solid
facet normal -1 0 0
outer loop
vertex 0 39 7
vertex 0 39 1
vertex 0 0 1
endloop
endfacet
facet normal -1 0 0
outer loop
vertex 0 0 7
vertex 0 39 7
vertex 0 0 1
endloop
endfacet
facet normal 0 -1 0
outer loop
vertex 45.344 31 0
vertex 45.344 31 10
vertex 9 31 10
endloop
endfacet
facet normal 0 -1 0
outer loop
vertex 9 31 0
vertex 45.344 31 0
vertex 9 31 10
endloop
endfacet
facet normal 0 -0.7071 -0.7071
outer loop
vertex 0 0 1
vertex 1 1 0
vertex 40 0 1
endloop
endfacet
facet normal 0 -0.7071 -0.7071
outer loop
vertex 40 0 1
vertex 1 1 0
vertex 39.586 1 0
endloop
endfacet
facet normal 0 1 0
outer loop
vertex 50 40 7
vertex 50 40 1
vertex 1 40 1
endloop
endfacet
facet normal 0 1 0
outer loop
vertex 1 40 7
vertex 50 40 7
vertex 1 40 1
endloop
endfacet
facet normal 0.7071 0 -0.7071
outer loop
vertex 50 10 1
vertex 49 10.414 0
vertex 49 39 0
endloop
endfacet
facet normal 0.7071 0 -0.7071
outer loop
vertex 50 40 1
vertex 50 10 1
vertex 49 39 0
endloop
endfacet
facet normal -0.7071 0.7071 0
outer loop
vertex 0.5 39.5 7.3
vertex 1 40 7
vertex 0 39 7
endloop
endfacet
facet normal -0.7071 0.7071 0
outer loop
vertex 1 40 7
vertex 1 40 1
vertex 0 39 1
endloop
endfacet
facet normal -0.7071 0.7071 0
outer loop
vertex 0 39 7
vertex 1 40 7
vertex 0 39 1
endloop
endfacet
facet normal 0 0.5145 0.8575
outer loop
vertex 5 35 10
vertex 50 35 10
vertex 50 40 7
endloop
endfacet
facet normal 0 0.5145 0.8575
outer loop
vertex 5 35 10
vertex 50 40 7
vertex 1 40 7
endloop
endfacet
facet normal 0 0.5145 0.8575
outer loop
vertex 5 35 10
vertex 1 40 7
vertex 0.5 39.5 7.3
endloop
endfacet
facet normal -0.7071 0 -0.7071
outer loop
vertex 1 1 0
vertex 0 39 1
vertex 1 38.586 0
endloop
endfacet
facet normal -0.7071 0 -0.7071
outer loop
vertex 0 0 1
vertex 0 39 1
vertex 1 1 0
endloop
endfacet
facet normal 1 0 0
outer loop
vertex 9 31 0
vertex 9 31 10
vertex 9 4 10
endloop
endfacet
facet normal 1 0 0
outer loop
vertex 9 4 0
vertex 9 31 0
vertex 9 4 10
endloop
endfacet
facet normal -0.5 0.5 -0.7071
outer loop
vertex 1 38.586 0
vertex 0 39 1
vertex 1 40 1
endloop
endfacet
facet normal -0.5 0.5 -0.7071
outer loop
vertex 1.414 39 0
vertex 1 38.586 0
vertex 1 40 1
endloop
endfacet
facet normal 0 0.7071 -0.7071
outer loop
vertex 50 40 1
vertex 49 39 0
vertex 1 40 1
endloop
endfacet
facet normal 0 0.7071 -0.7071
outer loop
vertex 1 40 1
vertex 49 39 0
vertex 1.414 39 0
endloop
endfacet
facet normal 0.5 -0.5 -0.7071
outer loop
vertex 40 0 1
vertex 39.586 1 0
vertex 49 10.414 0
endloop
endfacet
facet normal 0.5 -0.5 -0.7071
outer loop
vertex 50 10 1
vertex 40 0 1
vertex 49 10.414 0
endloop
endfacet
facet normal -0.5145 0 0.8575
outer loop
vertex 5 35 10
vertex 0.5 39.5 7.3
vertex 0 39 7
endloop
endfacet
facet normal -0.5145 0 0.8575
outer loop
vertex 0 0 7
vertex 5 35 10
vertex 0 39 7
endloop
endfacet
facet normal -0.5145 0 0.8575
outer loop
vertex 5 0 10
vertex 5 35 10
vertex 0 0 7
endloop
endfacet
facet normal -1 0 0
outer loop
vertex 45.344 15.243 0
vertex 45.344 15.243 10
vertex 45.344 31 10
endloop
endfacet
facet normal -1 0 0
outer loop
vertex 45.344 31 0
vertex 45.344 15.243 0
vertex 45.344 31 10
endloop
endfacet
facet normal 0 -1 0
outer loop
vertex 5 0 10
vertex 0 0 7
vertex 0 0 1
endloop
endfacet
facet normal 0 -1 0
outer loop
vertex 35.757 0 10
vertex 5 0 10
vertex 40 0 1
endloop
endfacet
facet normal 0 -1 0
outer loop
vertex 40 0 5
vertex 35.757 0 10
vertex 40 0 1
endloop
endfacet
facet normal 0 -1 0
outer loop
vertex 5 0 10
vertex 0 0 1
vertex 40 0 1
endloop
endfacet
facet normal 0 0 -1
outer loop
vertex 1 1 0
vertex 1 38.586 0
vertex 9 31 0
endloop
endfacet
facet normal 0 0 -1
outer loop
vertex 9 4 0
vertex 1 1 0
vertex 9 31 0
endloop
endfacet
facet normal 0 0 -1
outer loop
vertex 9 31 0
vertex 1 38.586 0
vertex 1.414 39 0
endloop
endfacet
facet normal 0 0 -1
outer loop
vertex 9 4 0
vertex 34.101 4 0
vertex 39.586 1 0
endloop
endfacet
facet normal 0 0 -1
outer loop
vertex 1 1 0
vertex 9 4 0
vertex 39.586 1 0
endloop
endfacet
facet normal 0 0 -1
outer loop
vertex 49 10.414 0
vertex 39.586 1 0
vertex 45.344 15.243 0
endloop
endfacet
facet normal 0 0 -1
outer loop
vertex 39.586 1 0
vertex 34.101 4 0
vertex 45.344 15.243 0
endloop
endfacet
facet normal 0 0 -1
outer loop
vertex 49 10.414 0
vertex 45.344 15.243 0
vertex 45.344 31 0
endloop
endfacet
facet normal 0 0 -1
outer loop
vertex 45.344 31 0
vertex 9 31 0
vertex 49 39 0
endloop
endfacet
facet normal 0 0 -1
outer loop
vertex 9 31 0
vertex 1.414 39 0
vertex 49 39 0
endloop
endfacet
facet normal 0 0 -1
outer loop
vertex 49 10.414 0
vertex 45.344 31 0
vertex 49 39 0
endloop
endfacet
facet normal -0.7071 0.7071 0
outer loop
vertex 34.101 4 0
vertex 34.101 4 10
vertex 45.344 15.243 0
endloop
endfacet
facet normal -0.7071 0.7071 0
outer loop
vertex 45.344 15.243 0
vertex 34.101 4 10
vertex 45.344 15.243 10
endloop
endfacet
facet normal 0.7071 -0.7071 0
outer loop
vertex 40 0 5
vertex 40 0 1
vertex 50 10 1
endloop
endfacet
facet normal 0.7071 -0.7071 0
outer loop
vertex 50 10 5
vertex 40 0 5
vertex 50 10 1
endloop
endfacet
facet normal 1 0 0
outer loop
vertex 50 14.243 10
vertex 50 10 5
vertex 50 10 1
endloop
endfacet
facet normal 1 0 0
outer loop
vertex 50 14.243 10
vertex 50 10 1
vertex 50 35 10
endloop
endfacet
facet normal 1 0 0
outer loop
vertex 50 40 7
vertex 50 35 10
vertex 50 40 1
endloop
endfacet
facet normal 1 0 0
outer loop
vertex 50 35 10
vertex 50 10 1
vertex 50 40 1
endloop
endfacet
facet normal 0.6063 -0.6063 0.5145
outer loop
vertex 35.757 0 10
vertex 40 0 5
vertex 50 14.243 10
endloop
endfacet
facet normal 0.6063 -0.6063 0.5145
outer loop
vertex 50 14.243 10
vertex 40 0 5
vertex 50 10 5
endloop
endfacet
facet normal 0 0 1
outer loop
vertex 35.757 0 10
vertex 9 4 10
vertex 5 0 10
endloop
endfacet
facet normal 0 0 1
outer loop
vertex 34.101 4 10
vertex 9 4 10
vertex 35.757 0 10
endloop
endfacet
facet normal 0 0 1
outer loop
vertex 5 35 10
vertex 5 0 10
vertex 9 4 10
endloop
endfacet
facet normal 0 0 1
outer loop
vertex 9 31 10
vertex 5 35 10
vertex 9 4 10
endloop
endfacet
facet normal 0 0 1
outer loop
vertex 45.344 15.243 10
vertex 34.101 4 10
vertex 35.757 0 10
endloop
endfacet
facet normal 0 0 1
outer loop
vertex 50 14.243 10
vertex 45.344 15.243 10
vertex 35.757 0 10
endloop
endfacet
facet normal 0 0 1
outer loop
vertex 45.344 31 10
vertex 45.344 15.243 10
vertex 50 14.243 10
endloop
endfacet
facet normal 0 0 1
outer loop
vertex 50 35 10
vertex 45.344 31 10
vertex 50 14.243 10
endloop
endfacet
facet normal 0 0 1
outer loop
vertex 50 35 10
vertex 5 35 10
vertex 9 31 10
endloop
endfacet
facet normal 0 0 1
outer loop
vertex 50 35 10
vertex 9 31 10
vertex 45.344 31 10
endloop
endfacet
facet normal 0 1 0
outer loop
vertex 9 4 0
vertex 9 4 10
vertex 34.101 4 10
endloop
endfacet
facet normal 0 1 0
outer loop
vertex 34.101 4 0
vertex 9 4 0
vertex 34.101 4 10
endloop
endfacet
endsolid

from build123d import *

# Parameters (mm, degrees)
F1_DEPTH    = 10
F2_C1_SIZE2 = 5
F2_C1_SIZE  = 3
F2_C2_SIZE2 = 5
F2_C2_SIZE  = 3
F2_C3_SIZE2 = 5
F2_C3_SIZE  = 3
F3_T1_DEPTH = 12.1433659759
F5_SIZE     = 1
F7_DEPTH    = 10.001


# Not quite as in the source:
# - a fillet or chamfer that OpenCascade refuses, or shapes differently, is made with other operations: its cross-section is extruded or revolved along the edge and cut away or added
# - two fillets or chamfers of one size are made in one step


with BuildPart() as f1:
    # F0 (on Top) → F1 (new body)
    with BuildSketch(Plane.XY):
        Polygon((50, 40), (0, 40), (0, 0), (40, 0), (50, 10), align=None)
    extrude(amount=F1_DEPTH)

    # F2: chamfer of 5 x 3 on 3 edges, made by hand

    # F2_c1
    f2_c1_edges = [f1.edges().sort_by_distance(p)[0] for p in [
        (25, 40, 10),
    ]]
    f2_c1_side = f1.faces().sort_by_distance((25, 40, 9.94))[0]
    chamfer(f2_c1_edges, length=F2_C1_SIZE, length2=F2_C1_SIZE2, reference=f2_c1_side)

    # F2_c2
    f2_c2_edges = [f1.edges().sort_by_distance(p)[0] for p in [
        (0, 17.5, 10),
    ]]
    f2_c2_side = f1.faces().sort_by_distance((0, 17.5, 9.94))[0]
    chamfer(f2_c2_edges, length=F2_C2_SIZE, length2=F2_C2_SIZE2, reference=f2_c2_side)

    # F2_c3
    f2_c3_edges = [f1.edges().sort_by_distance(p)[0] for p in [
        (45, 5, 10),
    ]]
    f2_c3_side = f1.faces().sort_by_distance((44.9575735931, 5.0424264069, 10))[0]
    chamfer(f2_c3_edges, length=F2_C3_SIZE, length2=F2_C3_SIZE2, reference=f2_c3_side)

    # F3: chamfer of 1 on 1 edges, made by hand

    # F3_s2 → F3_t1 (cut)
    with BuildSketch(Plane.XY.offset(-2.571682988)):
        Polygon((1, 40), (0, 39), (0, 40), align=None)
    extrude(amount=F3_T1_DEPTH, mode=Mode.SUBTRACT)

    # F5
    f5_edges = [f1.edges().sort_by_distance(p)[0] for p in [
        (50, 25, 0),
        (45, 5, 0),
        (20, 0, 0),
        (0, 19.5, 0),
        (0.5, 39.5, 0),
        (25.5, 40, 0),
    ]]
    chamfer(f5_edges, length=F5_SIZE)

    # F6 (on face) → F7 (cut, through all)
    with BuildSketch(Plane.XY.offset(10)):
        Polygon((9, 31), (9, 4), (34.1005050634, 4), (45.3436888701, 15.2431838067), (45.3436888701, 31), align=None)
    extrude(amount=-F7_DEPTH, mode=Mode.SUBTRACT)


solid = f1.part
